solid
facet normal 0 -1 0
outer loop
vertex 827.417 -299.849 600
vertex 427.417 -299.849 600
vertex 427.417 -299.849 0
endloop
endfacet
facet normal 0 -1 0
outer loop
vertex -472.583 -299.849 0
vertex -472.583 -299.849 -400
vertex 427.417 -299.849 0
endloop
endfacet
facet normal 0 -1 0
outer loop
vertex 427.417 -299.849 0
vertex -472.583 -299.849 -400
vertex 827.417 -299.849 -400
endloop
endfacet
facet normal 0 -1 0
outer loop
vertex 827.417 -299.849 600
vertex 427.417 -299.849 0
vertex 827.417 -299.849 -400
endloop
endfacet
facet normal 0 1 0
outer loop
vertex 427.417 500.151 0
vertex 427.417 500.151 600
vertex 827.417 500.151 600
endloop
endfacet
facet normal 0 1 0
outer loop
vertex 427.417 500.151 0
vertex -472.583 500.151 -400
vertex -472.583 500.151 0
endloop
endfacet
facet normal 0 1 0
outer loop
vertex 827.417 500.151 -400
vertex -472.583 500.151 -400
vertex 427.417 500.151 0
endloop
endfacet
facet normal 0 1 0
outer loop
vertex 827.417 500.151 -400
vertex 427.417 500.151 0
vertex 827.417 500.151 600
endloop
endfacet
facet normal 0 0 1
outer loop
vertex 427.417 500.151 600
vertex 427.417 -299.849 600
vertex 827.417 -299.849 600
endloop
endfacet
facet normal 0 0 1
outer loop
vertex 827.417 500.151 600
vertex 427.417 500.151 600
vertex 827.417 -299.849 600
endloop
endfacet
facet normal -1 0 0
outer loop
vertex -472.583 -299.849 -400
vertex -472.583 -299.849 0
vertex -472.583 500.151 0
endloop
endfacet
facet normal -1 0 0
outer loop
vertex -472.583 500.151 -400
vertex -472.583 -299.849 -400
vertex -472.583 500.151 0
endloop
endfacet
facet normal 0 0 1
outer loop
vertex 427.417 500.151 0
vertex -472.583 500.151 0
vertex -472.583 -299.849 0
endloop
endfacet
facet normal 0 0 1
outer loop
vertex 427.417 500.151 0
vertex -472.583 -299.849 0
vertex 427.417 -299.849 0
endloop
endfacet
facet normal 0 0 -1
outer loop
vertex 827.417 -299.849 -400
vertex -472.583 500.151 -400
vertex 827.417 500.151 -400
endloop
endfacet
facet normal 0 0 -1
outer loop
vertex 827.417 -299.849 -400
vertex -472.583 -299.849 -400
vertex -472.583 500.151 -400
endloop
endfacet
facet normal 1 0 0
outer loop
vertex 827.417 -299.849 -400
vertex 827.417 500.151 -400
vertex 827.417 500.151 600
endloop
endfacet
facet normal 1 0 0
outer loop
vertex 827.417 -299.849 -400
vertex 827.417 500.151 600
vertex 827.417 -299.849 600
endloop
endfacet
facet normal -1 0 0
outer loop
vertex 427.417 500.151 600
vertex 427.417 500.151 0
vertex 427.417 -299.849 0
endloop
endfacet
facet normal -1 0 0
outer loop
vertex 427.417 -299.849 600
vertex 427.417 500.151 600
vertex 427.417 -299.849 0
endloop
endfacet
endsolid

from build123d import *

# Parameters (mm, degrees)
F0_W     = 900
F0_H     = 800
F1_DEPTH = 400
F2_W     = 400
F2_H     = 800
F3_DEPTH = 1000


with BuildPart() as f1:
    # F0 (on Top) → F1 (new body)
    with BuildSketch(Plane.XY):
        with Locations((-22.583289, 100.151006)):
            Rectangle(F0_W, F0_H)
    extrude(amount=-F1_DEPTH)

    # F2 (on face) → F3 (join)
    with BuildSketch(Plane(origin=(0, 0, -400), x_dir=(1, 0, 0), z_dir=(0, 0, -1))):
        with Locations((627.416711, -100.151006)):
            Rectangle(F2_W, F2_H)
    extrude(amount=-F3_DEPTH)


solid = f1.part
